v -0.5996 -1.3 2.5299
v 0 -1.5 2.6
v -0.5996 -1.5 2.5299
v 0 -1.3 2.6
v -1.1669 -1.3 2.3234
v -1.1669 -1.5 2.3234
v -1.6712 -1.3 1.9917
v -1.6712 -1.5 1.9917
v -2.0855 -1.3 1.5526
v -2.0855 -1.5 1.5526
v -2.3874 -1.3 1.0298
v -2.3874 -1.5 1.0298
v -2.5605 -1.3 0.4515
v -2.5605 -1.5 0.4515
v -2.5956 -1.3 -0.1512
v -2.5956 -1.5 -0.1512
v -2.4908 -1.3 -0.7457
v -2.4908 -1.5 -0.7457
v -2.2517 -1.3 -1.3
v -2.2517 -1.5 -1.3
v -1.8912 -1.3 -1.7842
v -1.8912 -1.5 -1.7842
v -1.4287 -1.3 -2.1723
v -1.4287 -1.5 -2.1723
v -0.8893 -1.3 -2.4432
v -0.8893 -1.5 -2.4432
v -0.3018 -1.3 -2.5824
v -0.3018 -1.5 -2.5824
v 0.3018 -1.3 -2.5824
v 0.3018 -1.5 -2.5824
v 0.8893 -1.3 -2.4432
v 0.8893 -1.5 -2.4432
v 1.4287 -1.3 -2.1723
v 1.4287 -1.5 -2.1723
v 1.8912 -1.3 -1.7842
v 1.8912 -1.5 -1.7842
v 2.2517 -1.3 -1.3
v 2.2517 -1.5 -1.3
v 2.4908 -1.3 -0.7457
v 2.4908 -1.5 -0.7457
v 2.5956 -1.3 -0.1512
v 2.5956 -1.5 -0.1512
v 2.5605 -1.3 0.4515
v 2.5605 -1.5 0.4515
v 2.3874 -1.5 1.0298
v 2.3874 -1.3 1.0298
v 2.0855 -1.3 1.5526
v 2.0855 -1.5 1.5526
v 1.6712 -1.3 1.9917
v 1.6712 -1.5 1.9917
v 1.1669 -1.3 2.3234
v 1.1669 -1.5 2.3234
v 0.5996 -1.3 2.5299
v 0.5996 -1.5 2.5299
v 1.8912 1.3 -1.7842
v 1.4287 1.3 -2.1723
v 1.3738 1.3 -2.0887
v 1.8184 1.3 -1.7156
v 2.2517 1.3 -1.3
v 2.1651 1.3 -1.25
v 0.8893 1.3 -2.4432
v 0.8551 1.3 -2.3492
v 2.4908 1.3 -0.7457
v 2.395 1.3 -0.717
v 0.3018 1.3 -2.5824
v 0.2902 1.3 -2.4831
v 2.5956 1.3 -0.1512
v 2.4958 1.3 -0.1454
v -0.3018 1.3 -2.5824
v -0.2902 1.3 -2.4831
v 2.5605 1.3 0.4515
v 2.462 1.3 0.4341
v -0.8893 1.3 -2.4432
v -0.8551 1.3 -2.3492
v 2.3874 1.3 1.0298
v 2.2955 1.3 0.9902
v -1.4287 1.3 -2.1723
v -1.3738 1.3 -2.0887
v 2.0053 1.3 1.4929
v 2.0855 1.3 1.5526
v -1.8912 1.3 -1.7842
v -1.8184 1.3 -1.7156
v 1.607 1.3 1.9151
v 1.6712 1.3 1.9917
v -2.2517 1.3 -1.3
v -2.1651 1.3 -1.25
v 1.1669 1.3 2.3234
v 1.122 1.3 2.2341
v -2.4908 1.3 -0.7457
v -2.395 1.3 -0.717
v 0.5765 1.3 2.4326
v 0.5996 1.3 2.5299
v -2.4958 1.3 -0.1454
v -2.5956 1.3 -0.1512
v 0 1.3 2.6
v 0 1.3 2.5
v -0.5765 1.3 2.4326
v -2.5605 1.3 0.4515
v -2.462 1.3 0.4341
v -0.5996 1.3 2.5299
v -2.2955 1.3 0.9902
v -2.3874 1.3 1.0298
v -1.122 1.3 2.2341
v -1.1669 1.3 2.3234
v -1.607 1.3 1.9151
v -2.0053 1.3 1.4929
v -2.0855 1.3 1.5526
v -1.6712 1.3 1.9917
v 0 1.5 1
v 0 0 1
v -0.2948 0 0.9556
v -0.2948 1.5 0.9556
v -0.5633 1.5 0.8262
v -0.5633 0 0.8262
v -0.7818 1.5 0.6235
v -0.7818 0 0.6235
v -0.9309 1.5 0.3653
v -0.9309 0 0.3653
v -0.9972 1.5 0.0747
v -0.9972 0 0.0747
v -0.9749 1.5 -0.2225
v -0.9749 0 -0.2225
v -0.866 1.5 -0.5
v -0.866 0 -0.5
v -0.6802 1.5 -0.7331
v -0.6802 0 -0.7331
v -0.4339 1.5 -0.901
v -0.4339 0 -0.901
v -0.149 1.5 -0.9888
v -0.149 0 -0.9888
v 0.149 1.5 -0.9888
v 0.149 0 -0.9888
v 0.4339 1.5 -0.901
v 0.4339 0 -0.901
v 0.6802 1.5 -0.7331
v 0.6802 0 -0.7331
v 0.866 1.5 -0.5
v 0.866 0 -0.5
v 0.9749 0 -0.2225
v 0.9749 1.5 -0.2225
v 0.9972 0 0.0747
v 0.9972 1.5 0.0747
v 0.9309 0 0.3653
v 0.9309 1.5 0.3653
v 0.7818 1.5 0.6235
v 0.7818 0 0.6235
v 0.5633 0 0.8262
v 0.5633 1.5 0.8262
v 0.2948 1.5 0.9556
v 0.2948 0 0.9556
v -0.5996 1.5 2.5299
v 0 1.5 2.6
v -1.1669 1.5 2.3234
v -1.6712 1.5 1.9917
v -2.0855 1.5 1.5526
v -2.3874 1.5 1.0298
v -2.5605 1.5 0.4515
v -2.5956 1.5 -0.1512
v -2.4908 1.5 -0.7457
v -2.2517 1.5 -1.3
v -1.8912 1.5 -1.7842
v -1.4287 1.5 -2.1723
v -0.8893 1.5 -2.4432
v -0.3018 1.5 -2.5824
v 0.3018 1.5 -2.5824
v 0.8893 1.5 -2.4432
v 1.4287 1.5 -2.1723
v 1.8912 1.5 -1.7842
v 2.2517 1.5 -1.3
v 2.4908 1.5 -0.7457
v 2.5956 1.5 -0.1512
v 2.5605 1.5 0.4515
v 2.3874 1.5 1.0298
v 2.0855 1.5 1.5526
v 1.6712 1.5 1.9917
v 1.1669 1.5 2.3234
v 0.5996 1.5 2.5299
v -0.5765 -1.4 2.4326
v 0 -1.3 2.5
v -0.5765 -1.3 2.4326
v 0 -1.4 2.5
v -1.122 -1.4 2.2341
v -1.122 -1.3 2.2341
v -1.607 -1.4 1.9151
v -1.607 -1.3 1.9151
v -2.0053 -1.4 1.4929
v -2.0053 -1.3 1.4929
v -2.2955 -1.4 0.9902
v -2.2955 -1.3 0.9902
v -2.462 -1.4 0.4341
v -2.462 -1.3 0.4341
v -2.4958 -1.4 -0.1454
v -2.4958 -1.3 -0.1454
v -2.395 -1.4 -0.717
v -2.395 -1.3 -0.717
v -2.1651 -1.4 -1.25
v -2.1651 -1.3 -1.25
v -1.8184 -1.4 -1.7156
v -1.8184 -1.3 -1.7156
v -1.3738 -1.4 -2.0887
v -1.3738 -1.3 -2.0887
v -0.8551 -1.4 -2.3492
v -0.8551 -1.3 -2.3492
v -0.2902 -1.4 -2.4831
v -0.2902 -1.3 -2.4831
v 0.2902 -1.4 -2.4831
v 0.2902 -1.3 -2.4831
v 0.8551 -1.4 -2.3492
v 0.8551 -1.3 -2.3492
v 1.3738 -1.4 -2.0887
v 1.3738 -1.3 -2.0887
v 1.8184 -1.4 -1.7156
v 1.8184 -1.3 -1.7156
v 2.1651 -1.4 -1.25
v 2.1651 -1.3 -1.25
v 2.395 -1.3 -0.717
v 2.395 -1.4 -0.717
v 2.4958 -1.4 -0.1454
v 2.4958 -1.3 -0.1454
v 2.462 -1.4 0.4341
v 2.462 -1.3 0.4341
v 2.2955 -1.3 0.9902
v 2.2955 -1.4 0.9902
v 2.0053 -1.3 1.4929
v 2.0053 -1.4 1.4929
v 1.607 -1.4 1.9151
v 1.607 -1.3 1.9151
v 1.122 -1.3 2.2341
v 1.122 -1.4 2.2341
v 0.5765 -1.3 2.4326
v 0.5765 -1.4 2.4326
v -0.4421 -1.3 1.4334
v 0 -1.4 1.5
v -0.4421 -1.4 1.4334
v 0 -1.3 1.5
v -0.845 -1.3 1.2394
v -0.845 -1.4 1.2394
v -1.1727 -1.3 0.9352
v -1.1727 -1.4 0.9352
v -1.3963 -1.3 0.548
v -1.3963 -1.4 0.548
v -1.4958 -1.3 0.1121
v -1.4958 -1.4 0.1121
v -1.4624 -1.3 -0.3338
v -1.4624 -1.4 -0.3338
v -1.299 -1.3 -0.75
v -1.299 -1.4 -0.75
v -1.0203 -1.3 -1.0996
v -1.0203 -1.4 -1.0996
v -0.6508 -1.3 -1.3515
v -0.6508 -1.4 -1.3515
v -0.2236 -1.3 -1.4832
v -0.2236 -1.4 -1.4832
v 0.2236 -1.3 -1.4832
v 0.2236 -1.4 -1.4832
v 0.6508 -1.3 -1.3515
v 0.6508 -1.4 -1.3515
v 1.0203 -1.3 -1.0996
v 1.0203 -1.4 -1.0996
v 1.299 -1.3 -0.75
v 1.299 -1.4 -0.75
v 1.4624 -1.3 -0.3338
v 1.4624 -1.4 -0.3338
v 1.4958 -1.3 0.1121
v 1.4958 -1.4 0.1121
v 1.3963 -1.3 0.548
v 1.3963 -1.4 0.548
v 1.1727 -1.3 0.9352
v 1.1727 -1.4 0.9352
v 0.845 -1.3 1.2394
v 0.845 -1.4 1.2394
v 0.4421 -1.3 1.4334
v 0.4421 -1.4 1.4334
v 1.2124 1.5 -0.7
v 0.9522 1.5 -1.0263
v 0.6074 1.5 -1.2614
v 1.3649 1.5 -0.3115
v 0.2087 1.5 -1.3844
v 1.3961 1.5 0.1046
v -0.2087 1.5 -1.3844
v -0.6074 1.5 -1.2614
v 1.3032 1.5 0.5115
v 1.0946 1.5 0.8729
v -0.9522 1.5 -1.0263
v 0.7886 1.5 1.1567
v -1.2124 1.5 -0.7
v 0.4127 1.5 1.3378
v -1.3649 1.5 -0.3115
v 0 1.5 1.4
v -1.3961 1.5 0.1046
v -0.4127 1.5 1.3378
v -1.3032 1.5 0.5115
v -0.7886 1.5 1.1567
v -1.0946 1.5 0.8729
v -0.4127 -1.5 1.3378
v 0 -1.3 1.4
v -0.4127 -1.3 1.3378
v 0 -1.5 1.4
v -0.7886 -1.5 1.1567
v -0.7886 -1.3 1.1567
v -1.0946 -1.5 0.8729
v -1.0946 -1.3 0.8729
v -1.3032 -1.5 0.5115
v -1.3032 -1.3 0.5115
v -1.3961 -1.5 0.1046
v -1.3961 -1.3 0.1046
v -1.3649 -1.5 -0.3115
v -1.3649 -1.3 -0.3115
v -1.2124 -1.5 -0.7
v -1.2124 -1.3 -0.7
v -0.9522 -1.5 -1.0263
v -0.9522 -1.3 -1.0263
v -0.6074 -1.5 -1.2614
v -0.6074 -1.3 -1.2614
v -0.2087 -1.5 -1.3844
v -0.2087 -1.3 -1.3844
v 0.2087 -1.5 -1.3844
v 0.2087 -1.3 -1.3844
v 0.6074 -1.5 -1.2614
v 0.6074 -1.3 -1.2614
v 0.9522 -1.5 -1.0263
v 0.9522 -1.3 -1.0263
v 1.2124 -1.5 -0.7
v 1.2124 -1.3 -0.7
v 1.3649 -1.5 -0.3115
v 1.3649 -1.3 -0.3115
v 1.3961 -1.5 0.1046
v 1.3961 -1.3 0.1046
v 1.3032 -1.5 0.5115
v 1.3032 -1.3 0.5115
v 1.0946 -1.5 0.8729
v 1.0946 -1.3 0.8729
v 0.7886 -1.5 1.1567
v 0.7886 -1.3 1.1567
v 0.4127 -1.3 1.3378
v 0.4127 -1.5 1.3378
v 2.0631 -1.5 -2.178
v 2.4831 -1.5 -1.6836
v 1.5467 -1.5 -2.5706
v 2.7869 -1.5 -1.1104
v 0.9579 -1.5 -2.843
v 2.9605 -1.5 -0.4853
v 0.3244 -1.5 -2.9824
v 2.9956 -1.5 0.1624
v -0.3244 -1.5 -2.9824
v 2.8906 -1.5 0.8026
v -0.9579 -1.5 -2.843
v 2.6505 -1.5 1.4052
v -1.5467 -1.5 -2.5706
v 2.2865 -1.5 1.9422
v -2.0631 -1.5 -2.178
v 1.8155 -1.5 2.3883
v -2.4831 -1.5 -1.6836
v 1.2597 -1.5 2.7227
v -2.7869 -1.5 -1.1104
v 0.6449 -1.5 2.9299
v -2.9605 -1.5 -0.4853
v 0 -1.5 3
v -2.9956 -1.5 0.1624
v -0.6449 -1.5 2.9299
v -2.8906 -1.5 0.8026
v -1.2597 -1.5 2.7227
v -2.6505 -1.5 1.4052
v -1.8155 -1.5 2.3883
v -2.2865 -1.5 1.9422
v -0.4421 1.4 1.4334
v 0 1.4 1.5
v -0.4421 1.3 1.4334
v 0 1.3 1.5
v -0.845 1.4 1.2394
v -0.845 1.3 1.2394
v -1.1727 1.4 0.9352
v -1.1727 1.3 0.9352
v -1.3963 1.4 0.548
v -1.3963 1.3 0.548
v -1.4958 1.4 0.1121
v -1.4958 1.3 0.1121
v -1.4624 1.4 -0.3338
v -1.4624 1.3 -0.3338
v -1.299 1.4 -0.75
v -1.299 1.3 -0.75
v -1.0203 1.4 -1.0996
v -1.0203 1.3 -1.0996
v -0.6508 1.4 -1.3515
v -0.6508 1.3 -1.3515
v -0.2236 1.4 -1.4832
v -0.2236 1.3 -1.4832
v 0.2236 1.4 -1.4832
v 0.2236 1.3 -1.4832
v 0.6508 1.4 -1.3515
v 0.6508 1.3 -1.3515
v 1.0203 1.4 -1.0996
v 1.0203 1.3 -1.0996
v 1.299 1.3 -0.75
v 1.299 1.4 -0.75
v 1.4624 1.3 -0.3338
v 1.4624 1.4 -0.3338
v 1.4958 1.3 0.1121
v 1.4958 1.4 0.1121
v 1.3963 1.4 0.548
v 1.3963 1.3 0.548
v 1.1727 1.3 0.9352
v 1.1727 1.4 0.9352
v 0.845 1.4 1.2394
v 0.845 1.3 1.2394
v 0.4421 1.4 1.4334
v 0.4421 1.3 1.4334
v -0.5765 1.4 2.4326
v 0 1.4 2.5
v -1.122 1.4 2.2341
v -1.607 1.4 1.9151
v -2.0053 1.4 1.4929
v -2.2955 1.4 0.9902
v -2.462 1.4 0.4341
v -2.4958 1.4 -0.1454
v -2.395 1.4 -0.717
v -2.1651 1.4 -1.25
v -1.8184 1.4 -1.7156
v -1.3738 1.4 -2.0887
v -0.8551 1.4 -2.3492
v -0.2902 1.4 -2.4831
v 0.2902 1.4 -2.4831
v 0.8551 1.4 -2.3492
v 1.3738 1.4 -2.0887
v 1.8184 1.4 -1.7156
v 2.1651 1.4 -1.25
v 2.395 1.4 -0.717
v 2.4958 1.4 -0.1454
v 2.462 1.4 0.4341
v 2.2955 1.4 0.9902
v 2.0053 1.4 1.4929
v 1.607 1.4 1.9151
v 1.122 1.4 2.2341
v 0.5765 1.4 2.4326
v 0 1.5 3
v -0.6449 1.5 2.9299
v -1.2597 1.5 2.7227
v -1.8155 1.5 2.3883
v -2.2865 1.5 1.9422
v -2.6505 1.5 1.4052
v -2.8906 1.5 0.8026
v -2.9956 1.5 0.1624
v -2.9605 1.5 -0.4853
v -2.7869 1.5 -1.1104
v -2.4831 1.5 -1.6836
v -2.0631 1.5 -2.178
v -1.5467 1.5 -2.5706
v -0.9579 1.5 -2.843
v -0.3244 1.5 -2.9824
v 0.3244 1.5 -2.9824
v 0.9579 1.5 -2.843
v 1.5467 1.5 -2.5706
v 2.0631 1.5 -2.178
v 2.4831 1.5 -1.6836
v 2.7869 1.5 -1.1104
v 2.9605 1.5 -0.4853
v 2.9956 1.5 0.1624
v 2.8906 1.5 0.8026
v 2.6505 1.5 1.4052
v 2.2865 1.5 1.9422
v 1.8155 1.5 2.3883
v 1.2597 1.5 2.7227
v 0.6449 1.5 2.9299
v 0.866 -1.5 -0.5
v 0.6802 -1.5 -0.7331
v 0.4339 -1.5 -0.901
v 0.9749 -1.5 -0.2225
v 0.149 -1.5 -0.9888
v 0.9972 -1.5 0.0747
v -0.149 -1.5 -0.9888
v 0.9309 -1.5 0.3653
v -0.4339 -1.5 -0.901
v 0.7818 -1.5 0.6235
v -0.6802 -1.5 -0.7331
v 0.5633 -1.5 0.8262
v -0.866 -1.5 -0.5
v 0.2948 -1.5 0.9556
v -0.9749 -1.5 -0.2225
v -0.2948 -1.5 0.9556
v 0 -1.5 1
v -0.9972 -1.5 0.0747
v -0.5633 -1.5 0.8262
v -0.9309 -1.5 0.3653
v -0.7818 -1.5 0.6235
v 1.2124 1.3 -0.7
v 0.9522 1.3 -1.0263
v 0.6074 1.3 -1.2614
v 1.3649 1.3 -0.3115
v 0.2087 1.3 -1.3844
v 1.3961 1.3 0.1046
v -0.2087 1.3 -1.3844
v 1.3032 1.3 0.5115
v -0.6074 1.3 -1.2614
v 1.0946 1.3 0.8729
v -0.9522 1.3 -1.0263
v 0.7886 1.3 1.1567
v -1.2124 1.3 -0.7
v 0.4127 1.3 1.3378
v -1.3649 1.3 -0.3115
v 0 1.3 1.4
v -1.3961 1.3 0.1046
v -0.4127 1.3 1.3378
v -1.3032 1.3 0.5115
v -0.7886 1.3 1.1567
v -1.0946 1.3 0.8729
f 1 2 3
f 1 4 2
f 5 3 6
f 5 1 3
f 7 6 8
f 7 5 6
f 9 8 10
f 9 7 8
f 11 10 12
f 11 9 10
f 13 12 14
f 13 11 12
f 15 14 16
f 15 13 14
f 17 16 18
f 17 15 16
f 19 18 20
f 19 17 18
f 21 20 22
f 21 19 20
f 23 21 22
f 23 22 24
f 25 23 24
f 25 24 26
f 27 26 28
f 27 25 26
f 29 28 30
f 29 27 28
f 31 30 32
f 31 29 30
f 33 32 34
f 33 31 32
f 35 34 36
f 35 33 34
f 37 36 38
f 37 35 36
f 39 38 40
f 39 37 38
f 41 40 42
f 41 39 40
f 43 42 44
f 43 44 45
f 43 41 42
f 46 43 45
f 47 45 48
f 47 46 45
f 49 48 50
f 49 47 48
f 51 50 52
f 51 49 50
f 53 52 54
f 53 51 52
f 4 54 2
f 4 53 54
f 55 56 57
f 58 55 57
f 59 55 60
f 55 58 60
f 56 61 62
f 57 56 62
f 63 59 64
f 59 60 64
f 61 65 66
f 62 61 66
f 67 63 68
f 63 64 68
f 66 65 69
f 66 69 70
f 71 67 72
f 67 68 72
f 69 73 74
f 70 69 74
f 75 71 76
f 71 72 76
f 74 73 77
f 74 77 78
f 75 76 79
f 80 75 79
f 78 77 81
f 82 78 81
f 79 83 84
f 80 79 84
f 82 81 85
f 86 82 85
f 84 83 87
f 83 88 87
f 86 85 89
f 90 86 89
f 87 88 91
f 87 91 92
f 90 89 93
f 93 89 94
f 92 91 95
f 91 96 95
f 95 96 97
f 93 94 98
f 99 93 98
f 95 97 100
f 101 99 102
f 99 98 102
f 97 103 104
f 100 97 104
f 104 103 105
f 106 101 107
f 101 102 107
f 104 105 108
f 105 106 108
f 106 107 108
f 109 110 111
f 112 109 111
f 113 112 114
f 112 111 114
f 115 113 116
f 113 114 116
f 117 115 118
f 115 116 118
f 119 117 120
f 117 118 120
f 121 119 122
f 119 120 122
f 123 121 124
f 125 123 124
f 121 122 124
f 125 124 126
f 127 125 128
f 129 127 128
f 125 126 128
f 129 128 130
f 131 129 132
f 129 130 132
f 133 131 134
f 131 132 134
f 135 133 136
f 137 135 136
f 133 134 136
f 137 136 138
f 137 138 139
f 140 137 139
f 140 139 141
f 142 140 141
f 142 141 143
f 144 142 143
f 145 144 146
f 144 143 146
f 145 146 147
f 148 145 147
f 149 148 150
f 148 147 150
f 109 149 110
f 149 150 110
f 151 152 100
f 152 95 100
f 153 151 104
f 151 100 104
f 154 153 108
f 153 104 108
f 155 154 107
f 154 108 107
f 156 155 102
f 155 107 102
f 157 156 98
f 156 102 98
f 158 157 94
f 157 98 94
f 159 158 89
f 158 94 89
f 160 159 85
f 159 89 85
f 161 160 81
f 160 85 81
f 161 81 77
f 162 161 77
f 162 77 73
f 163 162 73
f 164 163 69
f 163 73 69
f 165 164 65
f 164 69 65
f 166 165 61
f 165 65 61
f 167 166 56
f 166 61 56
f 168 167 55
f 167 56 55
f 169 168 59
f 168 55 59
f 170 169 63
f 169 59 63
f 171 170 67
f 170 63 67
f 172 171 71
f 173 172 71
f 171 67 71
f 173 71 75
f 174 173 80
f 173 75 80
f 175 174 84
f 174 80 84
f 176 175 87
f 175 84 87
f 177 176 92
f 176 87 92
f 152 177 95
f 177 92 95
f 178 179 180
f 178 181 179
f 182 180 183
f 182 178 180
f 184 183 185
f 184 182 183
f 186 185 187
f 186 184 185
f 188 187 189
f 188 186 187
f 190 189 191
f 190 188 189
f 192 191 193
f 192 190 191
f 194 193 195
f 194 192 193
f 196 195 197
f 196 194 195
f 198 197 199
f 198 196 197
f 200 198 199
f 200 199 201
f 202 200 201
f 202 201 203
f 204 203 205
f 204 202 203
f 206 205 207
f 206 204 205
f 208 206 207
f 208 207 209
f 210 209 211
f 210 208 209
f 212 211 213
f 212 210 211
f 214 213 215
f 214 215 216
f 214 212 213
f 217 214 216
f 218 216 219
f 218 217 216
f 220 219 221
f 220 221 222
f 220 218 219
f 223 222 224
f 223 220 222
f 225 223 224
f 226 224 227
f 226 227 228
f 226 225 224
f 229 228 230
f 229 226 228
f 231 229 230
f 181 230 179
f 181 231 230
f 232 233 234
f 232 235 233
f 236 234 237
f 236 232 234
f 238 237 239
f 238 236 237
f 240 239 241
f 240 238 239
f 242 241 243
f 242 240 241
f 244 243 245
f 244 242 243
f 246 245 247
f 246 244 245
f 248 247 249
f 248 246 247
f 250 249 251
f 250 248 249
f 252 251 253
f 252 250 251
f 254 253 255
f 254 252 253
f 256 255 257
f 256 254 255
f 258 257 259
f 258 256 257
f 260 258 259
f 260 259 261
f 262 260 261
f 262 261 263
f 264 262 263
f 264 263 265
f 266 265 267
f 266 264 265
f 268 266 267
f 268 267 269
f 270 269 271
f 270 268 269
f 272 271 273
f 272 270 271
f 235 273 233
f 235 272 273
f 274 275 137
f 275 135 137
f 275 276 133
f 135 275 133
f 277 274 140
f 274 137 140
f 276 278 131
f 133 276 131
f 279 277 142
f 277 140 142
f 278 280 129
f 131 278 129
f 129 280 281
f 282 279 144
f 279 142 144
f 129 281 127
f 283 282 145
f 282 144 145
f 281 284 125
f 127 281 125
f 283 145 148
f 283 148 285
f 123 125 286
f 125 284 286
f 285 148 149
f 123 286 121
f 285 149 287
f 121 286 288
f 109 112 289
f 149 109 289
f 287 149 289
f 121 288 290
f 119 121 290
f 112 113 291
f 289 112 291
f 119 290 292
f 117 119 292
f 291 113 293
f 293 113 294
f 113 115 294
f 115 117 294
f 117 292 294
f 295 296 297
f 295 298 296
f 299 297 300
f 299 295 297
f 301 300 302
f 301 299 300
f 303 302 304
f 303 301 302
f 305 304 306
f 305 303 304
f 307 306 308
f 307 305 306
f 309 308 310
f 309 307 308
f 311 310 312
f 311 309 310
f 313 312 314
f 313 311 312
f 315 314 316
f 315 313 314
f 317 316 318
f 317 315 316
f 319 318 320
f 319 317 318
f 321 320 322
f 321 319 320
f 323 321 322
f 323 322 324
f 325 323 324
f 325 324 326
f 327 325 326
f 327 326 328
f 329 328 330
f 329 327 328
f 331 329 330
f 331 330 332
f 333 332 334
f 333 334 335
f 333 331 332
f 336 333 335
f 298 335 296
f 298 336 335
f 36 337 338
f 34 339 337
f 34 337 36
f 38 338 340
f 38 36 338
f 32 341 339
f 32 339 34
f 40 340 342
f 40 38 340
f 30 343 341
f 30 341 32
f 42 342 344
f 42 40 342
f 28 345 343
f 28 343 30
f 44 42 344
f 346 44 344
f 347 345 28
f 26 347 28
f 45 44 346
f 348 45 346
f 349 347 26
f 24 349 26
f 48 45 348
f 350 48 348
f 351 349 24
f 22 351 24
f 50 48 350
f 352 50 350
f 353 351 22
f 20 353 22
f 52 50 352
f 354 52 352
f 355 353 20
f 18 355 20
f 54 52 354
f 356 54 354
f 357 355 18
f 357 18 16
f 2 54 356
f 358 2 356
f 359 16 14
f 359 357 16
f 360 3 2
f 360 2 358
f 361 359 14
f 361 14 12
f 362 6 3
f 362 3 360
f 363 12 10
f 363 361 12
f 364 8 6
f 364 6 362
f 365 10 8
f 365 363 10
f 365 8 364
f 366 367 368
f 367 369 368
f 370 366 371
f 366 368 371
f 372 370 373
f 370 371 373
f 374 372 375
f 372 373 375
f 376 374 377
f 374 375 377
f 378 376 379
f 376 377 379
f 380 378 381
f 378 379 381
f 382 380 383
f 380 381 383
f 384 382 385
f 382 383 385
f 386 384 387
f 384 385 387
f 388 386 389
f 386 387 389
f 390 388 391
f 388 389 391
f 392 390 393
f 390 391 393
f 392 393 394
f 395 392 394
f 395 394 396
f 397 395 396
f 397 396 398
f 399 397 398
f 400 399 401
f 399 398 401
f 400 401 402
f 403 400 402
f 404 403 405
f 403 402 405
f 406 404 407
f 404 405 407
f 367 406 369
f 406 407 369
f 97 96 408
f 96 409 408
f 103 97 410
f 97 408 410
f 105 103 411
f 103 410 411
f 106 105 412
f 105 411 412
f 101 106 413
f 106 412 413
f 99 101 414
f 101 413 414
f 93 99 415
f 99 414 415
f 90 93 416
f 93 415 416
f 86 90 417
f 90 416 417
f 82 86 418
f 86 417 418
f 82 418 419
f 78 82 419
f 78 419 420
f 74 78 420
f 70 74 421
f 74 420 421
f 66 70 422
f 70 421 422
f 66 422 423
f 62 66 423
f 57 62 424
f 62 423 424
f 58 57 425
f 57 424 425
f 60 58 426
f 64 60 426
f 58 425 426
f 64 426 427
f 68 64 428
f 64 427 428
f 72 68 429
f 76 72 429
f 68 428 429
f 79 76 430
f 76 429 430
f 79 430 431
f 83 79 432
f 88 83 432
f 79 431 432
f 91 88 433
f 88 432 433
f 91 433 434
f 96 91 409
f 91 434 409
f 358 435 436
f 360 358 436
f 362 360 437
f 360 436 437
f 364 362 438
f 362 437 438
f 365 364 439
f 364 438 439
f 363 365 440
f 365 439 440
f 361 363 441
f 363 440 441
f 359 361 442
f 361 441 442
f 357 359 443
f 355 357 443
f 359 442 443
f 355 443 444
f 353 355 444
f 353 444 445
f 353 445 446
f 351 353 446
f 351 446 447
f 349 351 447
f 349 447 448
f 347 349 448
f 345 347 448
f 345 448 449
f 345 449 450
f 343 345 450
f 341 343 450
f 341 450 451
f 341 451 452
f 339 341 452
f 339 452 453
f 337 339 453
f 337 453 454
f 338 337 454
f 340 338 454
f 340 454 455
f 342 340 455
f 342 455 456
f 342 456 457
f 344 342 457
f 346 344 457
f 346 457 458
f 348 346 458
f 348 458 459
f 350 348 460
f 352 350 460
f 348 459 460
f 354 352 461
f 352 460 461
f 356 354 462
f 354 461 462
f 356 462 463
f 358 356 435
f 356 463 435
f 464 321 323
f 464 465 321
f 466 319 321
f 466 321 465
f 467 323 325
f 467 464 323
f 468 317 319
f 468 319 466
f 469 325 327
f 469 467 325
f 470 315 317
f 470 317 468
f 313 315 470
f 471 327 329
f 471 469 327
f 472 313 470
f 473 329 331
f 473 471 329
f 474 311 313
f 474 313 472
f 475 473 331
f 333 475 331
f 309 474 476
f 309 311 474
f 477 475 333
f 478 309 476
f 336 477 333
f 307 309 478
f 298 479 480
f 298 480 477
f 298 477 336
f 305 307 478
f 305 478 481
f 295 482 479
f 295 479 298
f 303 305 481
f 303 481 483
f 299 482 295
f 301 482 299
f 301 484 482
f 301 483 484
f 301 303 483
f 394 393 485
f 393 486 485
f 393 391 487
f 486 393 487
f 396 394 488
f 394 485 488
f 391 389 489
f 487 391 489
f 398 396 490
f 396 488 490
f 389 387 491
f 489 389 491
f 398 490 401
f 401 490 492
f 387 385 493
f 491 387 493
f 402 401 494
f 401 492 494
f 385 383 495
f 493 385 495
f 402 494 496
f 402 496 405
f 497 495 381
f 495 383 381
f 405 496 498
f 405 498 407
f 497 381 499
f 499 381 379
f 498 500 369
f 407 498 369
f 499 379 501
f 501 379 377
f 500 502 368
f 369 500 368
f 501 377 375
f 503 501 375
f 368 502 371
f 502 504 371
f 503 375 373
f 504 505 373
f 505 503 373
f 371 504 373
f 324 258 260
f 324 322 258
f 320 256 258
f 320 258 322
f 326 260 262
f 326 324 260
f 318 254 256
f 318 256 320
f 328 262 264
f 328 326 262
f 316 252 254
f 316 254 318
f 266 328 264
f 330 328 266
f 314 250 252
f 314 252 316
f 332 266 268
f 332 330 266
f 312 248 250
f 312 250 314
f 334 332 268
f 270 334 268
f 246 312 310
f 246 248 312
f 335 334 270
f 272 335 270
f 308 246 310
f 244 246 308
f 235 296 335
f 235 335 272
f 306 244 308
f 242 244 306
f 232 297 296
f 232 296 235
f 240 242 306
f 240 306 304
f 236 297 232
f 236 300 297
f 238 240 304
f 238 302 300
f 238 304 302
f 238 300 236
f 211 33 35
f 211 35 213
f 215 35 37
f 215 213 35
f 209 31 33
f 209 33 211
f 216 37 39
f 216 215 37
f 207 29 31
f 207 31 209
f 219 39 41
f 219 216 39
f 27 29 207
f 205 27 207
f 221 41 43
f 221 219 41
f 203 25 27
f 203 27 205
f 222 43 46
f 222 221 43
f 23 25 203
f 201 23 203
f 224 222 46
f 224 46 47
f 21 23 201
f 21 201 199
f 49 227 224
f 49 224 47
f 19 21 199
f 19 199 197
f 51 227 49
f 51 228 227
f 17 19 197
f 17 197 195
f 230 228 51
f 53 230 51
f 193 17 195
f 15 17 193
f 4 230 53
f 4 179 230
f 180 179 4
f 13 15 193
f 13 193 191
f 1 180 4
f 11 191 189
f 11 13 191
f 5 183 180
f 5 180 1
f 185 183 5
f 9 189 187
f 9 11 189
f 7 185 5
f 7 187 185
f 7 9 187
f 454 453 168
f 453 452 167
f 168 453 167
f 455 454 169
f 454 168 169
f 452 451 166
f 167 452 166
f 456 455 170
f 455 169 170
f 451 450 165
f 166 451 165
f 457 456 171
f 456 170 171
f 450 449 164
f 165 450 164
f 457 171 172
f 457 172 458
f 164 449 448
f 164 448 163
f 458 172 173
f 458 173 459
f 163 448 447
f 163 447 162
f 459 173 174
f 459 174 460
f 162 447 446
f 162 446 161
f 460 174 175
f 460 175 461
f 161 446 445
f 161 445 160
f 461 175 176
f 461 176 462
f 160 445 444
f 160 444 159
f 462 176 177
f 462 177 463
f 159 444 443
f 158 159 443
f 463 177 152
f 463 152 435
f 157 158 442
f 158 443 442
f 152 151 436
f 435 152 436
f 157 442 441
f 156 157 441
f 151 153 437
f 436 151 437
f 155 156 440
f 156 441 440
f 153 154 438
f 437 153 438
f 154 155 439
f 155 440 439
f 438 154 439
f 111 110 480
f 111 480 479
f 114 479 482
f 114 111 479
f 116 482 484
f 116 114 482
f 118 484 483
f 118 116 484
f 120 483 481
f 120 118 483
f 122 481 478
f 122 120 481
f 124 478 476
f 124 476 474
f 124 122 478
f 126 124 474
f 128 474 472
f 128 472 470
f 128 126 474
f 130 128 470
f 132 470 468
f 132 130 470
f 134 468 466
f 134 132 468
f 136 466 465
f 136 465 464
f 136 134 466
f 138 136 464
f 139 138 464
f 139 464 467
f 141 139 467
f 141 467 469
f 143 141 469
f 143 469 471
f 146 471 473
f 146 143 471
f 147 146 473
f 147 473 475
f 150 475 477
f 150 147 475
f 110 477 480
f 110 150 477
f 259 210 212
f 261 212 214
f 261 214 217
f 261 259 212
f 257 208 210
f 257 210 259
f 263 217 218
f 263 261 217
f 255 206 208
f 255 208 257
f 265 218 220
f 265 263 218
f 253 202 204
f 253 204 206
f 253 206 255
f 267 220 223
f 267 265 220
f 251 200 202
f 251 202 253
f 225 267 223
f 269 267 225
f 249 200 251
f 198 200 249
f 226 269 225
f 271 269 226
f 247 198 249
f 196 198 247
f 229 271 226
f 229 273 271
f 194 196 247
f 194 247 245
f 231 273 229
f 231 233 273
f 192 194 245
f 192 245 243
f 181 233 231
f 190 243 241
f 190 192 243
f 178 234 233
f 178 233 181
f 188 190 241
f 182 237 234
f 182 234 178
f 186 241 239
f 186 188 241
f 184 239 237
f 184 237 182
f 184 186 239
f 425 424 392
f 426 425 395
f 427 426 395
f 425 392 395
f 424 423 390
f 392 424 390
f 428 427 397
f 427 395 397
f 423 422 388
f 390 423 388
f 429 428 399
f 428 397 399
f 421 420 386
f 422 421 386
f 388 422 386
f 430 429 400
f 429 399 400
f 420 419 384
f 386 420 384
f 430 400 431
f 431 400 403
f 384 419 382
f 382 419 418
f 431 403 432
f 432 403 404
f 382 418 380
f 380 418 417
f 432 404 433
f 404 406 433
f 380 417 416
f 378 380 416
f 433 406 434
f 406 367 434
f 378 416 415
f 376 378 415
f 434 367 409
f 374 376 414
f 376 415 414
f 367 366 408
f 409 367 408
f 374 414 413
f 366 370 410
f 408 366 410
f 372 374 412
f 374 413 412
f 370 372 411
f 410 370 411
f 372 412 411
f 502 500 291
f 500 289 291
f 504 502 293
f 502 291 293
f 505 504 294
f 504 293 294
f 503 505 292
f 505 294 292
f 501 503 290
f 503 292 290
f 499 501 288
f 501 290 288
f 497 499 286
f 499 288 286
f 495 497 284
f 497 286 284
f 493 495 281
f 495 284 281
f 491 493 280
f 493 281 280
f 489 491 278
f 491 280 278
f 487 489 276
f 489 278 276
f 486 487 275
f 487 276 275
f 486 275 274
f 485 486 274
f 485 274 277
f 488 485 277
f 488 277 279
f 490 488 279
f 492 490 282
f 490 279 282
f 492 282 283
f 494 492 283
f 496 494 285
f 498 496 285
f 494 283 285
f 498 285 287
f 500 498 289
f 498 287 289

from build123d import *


with BuildPart() as part:
    # Sketch1 → Revolve1 (revolve)
    with BuildSketch(Plane(origin=(0, 0, 0), x_dir=(0, 0, -1), z_dir=(1, 0, 0))):
        Polygon((-3, 0), (-3, -1.5), (-2.6, -1.5), (-2.6, -1.3), (-2.5, -1.3), (-2.5, -1.4), (-1.5, -1.4), (-1.5, -1.3), (-1.4, -1.3), (-1.4, -1.5), (-1, -1.5), (-1, 0), align=None)
    revolve1 = revolve(axis=Axis((0, 0, 0), (0, -1, 0)))

    # Mirror1: Revolve1 across plane
    add(revolve1.mirror(Plane(origin=(0, 0, 1), x_dir=(0, 0, 1), z_dir=(0, 1, 0))))


solid = part.part
